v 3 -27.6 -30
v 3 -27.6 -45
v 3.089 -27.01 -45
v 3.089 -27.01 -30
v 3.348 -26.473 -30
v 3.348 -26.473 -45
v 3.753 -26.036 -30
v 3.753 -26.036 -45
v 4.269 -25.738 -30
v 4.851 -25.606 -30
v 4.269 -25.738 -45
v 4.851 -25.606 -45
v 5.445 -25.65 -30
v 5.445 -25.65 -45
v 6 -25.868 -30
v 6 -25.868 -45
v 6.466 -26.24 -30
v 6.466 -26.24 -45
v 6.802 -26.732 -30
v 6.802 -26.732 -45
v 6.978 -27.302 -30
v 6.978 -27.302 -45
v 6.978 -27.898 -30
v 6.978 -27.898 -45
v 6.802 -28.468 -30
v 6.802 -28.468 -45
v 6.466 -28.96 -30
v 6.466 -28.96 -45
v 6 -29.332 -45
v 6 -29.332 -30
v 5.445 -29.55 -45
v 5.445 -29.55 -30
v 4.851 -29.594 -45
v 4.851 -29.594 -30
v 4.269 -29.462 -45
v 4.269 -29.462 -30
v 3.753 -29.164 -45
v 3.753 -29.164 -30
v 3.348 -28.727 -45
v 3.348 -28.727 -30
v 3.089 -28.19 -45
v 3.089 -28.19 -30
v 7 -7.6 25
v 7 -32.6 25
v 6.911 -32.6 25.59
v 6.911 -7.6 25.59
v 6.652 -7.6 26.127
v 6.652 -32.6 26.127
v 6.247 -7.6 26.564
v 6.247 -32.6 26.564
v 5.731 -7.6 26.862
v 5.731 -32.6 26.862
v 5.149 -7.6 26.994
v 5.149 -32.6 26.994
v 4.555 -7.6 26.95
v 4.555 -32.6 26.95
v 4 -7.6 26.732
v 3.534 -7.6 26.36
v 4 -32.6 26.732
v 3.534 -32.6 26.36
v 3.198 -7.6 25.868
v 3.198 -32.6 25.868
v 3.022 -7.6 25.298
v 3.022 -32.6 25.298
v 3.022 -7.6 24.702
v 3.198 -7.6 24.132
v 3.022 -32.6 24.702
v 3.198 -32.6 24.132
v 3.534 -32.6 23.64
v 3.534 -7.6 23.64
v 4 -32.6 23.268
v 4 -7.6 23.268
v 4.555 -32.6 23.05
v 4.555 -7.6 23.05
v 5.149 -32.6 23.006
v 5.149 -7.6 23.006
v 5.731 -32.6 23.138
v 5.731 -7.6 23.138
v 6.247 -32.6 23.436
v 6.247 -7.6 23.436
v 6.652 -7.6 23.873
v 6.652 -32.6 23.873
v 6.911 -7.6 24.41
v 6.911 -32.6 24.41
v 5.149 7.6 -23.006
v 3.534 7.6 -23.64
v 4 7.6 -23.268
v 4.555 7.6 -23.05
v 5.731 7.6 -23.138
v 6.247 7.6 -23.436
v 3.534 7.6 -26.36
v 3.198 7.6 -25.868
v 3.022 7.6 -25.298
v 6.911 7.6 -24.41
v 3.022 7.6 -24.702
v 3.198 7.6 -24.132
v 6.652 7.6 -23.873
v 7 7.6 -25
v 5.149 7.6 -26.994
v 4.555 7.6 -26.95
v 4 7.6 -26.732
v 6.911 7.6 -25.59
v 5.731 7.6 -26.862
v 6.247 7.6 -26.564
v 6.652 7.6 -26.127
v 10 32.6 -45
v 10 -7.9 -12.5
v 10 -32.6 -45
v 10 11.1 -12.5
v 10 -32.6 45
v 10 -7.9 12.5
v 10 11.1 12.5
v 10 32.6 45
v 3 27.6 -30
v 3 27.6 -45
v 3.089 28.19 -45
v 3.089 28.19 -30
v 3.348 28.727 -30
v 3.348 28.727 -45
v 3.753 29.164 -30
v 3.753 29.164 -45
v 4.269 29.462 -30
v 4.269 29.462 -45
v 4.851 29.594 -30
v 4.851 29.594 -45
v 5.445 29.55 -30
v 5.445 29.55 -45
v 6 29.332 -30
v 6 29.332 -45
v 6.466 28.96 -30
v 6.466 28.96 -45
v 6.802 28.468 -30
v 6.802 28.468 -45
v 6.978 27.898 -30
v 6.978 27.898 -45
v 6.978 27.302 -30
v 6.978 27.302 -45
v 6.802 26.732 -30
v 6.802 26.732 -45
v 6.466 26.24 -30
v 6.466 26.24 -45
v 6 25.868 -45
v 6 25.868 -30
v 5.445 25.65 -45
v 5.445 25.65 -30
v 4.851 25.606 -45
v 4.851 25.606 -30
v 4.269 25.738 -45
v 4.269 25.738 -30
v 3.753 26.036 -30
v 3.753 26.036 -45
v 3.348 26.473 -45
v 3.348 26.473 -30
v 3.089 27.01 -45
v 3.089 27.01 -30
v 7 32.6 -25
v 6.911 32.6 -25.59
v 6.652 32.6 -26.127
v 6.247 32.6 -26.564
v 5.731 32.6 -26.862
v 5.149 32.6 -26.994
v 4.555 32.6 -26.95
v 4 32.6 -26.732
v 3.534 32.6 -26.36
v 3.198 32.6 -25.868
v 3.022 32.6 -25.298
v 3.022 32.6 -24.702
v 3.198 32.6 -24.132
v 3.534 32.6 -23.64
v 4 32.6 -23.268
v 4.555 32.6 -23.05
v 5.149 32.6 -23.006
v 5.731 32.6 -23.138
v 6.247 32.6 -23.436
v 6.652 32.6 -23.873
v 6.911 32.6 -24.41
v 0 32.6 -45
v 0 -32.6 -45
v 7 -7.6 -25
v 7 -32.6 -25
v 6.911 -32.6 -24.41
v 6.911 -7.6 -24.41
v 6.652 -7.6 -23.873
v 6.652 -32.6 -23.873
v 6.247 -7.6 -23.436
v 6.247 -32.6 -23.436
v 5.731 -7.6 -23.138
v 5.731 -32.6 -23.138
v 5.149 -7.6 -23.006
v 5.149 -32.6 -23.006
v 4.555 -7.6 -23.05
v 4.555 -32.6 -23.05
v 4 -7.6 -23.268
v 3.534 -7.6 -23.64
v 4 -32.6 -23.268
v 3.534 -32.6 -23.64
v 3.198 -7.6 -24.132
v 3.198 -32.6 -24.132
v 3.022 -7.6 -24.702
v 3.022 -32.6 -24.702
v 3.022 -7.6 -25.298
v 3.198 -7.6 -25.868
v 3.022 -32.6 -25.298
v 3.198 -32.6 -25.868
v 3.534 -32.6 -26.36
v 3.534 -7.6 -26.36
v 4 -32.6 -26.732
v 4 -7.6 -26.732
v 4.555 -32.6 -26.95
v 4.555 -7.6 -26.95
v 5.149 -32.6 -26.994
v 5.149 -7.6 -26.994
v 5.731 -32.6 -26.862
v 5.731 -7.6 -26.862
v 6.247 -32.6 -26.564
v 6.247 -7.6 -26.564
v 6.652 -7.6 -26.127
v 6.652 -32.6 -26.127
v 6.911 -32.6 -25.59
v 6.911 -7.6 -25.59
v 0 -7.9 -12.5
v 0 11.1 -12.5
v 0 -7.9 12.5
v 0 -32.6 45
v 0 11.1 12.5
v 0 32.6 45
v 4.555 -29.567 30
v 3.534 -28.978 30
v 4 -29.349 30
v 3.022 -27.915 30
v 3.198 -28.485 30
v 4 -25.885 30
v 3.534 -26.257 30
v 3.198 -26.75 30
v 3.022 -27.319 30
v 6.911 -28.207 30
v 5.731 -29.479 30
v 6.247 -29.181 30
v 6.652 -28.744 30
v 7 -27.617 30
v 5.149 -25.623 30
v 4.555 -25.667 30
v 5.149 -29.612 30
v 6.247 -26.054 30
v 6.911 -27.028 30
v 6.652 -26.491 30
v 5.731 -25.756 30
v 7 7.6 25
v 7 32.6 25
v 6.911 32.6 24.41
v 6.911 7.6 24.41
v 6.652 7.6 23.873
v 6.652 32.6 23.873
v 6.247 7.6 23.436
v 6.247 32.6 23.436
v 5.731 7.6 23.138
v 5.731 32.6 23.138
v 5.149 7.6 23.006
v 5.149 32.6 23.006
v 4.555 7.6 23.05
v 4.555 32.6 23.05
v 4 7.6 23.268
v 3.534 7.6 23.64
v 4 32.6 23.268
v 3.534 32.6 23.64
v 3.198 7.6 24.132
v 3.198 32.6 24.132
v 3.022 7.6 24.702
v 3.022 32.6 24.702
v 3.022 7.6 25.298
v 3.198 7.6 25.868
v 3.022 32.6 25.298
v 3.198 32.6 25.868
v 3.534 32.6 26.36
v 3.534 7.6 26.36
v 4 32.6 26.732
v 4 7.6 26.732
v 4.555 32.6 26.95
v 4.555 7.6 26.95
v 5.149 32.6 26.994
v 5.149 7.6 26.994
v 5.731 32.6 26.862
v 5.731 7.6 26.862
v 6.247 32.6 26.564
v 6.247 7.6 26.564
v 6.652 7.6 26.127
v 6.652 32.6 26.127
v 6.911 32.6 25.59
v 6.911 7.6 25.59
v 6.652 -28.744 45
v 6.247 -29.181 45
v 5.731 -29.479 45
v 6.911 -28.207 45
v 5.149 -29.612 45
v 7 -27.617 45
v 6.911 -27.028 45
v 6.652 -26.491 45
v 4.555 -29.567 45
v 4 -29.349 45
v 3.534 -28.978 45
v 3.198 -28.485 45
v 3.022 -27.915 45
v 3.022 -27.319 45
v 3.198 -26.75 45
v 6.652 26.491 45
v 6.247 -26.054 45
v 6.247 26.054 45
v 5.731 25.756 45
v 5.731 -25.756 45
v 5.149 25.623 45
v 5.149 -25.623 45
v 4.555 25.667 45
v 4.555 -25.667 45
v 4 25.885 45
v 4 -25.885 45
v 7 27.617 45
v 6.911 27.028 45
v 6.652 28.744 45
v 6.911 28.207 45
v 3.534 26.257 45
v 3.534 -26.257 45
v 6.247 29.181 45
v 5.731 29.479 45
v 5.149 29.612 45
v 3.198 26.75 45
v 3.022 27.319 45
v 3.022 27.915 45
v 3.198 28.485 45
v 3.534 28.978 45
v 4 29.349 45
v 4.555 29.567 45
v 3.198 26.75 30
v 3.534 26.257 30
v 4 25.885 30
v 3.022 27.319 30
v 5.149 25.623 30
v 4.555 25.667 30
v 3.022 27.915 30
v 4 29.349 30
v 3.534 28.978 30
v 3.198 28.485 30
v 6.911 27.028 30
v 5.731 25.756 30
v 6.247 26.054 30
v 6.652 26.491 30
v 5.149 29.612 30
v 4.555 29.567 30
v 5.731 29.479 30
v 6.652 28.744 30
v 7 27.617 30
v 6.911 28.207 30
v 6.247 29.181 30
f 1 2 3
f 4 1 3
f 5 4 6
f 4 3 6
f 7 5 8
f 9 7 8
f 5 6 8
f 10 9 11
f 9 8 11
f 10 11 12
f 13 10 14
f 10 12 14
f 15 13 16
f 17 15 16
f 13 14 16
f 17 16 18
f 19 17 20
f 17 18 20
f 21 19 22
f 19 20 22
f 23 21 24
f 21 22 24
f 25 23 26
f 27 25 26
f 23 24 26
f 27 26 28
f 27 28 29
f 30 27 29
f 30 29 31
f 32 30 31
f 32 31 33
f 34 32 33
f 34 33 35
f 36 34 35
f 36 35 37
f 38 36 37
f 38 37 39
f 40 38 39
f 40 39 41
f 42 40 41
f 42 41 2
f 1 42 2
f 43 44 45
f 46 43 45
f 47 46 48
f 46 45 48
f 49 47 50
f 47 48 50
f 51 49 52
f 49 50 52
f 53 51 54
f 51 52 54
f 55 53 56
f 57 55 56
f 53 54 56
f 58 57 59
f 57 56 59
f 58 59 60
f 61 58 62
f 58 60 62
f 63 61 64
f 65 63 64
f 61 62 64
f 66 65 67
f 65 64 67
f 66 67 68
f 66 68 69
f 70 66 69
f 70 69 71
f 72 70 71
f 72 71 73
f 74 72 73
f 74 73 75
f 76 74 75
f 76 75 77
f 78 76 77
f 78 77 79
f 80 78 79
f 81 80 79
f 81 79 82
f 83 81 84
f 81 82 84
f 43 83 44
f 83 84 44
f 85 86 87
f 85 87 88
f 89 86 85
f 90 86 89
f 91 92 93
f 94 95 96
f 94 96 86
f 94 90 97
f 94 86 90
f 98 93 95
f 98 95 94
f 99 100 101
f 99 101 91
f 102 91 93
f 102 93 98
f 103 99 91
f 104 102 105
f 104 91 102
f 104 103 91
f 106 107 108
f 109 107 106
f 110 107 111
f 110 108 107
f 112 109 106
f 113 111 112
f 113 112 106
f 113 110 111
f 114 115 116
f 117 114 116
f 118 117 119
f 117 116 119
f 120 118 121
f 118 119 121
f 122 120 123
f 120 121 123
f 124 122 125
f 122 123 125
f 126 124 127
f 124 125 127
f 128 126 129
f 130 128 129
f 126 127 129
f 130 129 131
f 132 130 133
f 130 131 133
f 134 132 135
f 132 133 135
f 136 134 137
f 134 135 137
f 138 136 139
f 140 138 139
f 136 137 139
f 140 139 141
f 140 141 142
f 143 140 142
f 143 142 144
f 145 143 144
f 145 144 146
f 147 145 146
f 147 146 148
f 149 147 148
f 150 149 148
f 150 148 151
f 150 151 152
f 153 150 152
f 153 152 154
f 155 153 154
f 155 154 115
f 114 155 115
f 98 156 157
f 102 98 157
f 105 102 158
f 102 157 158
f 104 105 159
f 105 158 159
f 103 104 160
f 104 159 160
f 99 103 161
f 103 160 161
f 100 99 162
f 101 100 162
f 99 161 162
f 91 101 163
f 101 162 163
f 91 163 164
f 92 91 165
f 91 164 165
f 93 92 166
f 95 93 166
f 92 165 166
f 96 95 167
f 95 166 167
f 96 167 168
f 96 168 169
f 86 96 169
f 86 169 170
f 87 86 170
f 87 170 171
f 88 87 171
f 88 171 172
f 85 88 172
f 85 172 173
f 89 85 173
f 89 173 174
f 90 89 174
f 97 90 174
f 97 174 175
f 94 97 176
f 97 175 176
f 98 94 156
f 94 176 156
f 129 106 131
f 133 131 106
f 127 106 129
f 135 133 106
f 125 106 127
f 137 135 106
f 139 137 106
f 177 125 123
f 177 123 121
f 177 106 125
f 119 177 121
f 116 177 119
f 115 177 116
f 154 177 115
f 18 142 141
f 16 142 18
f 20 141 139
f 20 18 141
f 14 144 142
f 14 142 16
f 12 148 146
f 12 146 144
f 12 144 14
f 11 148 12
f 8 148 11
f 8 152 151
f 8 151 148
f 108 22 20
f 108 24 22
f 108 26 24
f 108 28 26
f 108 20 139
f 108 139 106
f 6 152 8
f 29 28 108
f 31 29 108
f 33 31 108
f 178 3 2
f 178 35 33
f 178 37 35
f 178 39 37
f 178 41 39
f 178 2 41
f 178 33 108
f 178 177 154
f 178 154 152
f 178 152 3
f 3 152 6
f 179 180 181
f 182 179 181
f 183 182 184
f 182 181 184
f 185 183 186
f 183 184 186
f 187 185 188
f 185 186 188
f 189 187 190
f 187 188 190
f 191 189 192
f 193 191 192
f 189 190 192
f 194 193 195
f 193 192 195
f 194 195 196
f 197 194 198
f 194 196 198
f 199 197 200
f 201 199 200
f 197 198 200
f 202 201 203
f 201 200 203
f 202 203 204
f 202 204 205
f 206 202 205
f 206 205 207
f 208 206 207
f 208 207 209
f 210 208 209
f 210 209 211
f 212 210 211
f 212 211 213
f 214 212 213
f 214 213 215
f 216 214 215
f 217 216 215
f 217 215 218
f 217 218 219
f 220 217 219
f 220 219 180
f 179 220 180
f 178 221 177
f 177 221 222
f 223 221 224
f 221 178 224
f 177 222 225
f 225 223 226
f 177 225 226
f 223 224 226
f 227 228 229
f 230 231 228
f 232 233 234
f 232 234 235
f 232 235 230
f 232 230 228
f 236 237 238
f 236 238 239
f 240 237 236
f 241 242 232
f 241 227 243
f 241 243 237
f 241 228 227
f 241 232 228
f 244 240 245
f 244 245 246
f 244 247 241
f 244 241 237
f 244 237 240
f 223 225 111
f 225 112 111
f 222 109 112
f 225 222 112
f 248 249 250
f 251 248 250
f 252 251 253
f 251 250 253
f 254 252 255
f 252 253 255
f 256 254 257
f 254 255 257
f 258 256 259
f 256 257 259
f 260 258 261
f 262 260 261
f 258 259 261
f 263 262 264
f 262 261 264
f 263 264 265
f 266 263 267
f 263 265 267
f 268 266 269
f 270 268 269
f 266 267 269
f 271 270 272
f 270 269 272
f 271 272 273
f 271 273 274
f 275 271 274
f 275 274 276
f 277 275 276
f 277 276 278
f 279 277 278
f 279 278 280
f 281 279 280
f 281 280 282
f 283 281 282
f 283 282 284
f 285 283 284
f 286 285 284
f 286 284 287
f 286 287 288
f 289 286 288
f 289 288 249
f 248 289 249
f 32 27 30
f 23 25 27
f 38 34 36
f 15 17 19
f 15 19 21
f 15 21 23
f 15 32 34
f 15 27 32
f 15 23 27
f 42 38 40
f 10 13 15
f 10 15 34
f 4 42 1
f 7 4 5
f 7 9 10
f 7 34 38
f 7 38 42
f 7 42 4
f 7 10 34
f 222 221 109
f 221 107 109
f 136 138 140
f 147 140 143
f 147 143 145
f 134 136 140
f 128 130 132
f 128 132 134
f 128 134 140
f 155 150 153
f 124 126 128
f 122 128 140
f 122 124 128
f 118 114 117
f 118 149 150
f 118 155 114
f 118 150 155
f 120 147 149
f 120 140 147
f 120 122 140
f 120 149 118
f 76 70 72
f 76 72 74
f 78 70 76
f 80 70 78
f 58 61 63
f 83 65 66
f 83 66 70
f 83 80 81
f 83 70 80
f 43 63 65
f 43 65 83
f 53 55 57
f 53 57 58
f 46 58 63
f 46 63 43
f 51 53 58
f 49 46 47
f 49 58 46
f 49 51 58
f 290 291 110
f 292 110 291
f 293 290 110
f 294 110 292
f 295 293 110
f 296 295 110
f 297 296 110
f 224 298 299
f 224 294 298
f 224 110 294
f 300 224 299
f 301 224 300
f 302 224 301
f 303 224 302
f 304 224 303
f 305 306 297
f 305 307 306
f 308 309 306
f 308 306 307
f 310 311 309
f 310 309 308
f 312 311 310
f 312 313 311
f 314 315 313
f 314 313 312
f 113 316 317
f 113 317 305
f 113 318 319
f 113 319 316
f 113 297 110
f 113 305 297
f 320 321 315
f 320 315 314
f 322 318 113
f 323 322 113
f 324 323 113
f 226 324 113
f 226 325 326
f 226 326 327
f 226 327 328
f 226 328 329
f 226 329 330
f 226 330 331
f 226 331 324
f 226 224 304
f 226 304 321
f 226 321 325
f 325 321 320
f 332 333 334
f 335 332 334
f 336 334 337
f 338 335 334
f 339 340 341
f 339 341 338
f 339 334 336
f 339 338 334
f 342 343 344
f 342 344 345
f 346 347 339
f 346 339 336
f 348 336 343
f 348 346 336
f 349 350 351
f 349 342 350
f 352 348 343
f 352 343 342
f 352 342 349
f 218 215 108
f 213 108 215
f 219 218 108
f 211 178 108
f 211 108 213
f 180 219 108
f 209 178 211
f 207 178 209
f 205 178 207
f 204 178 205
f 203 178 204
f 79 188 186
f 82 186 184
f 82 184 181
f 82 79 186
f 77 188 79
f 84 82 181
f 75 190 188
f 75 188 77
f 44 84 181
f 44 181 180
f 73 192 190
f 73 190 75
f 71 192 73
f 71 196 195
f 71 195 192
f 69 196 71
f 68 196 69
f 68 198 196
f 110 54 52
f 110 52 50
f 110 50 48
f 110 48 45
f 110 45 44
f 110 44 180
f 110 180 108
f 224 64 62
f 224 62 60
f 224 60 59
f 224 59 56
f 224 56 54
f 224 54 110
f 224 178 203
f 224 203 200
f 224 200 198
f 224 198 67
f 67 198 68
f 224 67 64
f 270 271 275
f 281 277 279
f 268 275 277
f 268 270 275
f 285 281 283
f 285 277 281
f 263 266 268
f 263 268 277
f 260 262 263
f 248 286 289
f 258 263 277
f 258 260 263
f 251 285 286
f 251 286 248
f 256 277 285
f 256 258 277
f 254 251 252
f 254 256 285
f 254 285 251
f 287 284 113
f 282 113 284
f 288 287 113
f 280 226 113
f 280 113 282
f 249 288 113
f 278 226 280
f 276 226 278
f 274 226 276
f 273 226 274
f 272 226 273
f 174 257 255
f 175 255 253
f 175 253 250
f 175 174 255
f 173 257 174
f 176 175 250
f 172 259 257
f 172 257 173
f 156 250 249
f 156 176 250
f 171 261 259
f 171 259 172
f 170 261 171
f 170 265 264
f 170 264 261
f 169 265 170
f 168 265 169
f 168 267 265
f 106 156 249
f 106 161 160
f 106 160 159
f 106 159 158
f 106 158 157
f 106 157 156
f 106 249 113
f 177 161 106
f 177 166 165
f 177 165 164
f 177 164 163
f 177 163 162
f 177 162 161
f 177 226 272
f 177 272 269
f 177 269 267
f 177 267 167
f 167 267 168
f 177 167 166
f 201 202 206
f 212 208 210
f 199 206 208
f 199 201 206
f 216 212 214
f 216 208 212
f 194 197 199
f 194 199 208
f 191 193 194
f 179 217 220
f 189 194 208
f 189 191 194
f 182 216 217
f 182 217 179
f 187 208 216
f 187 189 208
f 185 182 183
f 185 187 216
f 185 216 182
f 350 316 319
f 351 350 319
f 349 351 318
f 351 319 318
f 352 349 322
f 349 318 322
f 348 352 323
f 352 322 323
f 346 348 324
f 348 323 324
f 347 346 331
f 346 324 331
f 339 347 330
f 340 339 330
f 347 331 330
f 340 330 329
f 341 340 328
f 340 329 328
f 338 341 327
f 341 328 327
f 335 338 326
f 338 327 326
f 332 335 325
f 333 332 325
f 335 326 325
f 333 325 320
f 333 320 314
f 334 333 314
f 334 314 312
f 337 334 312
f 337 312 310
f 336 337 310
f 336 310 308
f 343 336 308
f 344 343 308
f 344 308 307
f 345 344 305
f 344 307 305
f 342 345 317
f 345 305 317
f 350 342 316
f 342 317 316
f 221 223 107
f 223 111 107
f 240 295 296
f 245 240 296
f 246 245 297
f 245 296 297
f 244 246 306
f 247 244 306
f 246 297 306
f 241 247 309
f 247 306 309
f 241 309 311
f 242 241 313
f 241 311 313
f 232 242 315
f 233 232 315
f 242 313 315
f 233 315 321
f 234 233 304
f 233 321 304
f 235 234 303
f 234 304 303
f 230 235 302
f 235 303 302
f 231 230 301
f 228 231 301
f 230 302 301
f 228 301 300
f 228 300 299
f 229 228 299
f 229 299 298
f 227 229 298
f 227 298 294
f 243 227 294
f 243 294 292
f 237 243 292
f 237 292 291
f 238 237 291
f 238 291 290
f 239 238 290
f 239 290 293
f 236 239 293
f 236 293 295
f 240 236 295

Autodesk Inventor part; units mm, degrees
ref_plane "YZ Plane" through (0, 0, 0) normal (1, 0, 0) x (0, 1, 0)
ref_plane "XZ Plane" through (0, 0, 0) normal (0, 1, 0) x (-1, 0, 0)
ref_plane "XY Plane" through (0, 0, 0) normal (0, 0, 1) x (1, 0, 0)
sketch "Sketch1" plane through (0, 0, 0) normal (1, 0, 0) x (0, 1, 0)
  line L0 (-32.6, 45) -> (32.6, 45)
  line L1 (32.6, 45) -> (32.6, -45)
  line L2 (32.6, -45) -> (-32.6, -45)
  line L3 (-32.6, -45) -> (-32.6, 45)
  line L4 (-32.6, 45) -> (32.6, -45) construction
  line L5 (32.6, 45) -> (-32.6, -45) construction
  point P0 (0, 0)
  dimension "d0" = 65.2
  dimension "d1" = 90
extrude "Extrusion1" add sketch "Sketch1" along normal blind 10
sketch "Sketch2" plane through (0, 32.6, 45) normal (0, 1, 0) x (1, 0, 0)
  line L0 (0, 0) -> (10, 0) projected
  line L1 (0, 0) -> (5, 0)
  line L2 (5, 0) -> (5, 20)
  circle A0 centre (5, 20) radius 2
  line L3 (0, 45) -> (10, 45)
  line L4 (0, 90) -> (10, 90)
  line L5 (0, 90) -> (5, 90)
  line L6 (5, 90) -> (5, 70)
  circle A1 centre (5, 70) radius 2
  dimension "d4" = 5
  dimension "d5" = 20
  dimension "d6" = 4
extrude "Extrusion2" cut sketch "Sketch2" against normal blind 25
thread "Thread1" size "M4x0.7" class "6H" standard "ANSI Metric M Profile" full length
thread "Thread2" size "M4x0.7" class "6H" standard "ANSI Metric M Profile" full length
sketch "Sketch3" plane through (0, -32.6, -45) normal (0, -1, 0) x (1, 0, 0)
  line L0 (0, 45) -> (9.9068, 45)
  line L1 (10, 0) -> (10, 90) projected
  line L2 (10, 90) -> (5, 90)
  line L3 (0, 90) -> (10, 90) projected
  line L4 (5, 90) -> (5, 70)
  circle A0 centre (5, 70) radius 2
  line L5 (10, 0) -> (5, 0)
  line L6 (0, 0) -> (10, 0)
  line L7 (5, 0) -> (5, 20)
  circle A1 centre (5, 20) radius 2
  dimension "d13" = 5
  dimension "d14" = 20
  dimension "d15" = 4
extrude "Extrusion3" cut sketch "Sketch3" against normal blind 25
thread "Thread3" size "M4x0.7" class "6H" standard "ANSI Metric M Profile" full length
thread "Thread4" size "M4x0.7" class "6H" standard "ANSI Metric M Profile" full length
sketch "Sketch6" plane through (10, 0, 0) normal (1, 0, 0) x (0, 0, -1)
  line L0 (-45, -32.6) -> (45, -32.6) projected
  line L1 (0, -32.6) -> (0, 1.6)
  line L2 (-12.5, -7.9) -> (12.5, -7.9)
  line L3 (12.5, -7.9) -> (12.5, 11.1)
  line L4 (12.5, 11.1) -> (-12.5, 11.1)
  line L5 (-12.5, 11.1) -> (-12.5, -7.9)
  line L6 (-12.5, -7.9) -> (12.5, 11.1) construction
  line L7 (12.5, -7.9) -> (-12.5, 11.1) construction
  line L8 (45, 32.6) -> (-45, 32.6) projected
  point P0 (0, 0)
  dimension "d29" = 34.2
  dimension "d30" = 25
  dimension "d31" = 19
extrude "Extrusion6" cut sketch "Sketch6" against normal blind 10
sketch "Sketch10" plane through (10, 0, 0) normal (1, 0, 0) x (0, 0, -1)
  circle A0 centre (-27.5, 25.1) radius 2.5 projected
sketch "Sketch11" plane through (0, 0, 0) normal (-1, 0, 0) x (0, 0, 1)
  circle A0 centre (27.5, 25.1) radius 2.5 projected
sketch "Sketch12" plane through (0, -32.6, 45) normal (0, 0, 1) x (1, 0, 0)
  line L0 (0, 65.2173) -> (5, 65.2173)
  line L1 (5, 65.2173) -> (5, 60.2173)
  line L2 (0, 32.6) -> (10, 32.6)
  line L3 (10, 0) -> (10, 65.2) projected
  circle A0 centre (5, 60.2173) radius 2
  circle A1 centre (5, 4.9827) radius 2
  dimension "d46" = 5
  dimension "d47" = 5
  dimension "d48" = 4
extrude "Extrusion9" cut sketch "Sketch12" against normal blind 15
sketch "Sketch13" plane through (10, 0, 0) normal (1, 0, 0) x (0, 0, -1)
  point P0 (0, 0)
sketch "Sketch14" plane through (0, -32.6, -45) normal (0, 0, -1) x (-1, 0, 0)
  line L0 (0, 65.2) -> (-10, 65.2) projected
  line L1 (-10, 65.2) -> (-5, 65.2)
  line L2 (-5, 65.2) -> (-5, 60.2)
  circle A0 centre (-5, 60.2) radius 2
  line L3 (0, 32.6) -> (-10, 32.6)
  line L4 (-10, 43.7) -> (-10, 24.7) projected
  circle A1 centre (-5, 5) radius 2
  dimension "d51" = 5
  dimension "d52" = 5
  dimension "d53" = 4
extrude "Extrusion10" cut sketch "Sketch14" against normal blind 15
thread "Thread5" size "M4x0.7" class "6H" standard "ANSI Metric M Profile" full length
thread "Thread6" size "M4x0.7" class "6H" standard "ANSI Metric M Profile" full length
thread "Thread7" size "M4x0.7" class "6H" standard "ANSI Metric M Profile" full length
thread "Thread8" size "M4x0.7" class "6H" standard "ANSI Metric M Profile" full length
properties part number "Rb PEEK - Largo"
